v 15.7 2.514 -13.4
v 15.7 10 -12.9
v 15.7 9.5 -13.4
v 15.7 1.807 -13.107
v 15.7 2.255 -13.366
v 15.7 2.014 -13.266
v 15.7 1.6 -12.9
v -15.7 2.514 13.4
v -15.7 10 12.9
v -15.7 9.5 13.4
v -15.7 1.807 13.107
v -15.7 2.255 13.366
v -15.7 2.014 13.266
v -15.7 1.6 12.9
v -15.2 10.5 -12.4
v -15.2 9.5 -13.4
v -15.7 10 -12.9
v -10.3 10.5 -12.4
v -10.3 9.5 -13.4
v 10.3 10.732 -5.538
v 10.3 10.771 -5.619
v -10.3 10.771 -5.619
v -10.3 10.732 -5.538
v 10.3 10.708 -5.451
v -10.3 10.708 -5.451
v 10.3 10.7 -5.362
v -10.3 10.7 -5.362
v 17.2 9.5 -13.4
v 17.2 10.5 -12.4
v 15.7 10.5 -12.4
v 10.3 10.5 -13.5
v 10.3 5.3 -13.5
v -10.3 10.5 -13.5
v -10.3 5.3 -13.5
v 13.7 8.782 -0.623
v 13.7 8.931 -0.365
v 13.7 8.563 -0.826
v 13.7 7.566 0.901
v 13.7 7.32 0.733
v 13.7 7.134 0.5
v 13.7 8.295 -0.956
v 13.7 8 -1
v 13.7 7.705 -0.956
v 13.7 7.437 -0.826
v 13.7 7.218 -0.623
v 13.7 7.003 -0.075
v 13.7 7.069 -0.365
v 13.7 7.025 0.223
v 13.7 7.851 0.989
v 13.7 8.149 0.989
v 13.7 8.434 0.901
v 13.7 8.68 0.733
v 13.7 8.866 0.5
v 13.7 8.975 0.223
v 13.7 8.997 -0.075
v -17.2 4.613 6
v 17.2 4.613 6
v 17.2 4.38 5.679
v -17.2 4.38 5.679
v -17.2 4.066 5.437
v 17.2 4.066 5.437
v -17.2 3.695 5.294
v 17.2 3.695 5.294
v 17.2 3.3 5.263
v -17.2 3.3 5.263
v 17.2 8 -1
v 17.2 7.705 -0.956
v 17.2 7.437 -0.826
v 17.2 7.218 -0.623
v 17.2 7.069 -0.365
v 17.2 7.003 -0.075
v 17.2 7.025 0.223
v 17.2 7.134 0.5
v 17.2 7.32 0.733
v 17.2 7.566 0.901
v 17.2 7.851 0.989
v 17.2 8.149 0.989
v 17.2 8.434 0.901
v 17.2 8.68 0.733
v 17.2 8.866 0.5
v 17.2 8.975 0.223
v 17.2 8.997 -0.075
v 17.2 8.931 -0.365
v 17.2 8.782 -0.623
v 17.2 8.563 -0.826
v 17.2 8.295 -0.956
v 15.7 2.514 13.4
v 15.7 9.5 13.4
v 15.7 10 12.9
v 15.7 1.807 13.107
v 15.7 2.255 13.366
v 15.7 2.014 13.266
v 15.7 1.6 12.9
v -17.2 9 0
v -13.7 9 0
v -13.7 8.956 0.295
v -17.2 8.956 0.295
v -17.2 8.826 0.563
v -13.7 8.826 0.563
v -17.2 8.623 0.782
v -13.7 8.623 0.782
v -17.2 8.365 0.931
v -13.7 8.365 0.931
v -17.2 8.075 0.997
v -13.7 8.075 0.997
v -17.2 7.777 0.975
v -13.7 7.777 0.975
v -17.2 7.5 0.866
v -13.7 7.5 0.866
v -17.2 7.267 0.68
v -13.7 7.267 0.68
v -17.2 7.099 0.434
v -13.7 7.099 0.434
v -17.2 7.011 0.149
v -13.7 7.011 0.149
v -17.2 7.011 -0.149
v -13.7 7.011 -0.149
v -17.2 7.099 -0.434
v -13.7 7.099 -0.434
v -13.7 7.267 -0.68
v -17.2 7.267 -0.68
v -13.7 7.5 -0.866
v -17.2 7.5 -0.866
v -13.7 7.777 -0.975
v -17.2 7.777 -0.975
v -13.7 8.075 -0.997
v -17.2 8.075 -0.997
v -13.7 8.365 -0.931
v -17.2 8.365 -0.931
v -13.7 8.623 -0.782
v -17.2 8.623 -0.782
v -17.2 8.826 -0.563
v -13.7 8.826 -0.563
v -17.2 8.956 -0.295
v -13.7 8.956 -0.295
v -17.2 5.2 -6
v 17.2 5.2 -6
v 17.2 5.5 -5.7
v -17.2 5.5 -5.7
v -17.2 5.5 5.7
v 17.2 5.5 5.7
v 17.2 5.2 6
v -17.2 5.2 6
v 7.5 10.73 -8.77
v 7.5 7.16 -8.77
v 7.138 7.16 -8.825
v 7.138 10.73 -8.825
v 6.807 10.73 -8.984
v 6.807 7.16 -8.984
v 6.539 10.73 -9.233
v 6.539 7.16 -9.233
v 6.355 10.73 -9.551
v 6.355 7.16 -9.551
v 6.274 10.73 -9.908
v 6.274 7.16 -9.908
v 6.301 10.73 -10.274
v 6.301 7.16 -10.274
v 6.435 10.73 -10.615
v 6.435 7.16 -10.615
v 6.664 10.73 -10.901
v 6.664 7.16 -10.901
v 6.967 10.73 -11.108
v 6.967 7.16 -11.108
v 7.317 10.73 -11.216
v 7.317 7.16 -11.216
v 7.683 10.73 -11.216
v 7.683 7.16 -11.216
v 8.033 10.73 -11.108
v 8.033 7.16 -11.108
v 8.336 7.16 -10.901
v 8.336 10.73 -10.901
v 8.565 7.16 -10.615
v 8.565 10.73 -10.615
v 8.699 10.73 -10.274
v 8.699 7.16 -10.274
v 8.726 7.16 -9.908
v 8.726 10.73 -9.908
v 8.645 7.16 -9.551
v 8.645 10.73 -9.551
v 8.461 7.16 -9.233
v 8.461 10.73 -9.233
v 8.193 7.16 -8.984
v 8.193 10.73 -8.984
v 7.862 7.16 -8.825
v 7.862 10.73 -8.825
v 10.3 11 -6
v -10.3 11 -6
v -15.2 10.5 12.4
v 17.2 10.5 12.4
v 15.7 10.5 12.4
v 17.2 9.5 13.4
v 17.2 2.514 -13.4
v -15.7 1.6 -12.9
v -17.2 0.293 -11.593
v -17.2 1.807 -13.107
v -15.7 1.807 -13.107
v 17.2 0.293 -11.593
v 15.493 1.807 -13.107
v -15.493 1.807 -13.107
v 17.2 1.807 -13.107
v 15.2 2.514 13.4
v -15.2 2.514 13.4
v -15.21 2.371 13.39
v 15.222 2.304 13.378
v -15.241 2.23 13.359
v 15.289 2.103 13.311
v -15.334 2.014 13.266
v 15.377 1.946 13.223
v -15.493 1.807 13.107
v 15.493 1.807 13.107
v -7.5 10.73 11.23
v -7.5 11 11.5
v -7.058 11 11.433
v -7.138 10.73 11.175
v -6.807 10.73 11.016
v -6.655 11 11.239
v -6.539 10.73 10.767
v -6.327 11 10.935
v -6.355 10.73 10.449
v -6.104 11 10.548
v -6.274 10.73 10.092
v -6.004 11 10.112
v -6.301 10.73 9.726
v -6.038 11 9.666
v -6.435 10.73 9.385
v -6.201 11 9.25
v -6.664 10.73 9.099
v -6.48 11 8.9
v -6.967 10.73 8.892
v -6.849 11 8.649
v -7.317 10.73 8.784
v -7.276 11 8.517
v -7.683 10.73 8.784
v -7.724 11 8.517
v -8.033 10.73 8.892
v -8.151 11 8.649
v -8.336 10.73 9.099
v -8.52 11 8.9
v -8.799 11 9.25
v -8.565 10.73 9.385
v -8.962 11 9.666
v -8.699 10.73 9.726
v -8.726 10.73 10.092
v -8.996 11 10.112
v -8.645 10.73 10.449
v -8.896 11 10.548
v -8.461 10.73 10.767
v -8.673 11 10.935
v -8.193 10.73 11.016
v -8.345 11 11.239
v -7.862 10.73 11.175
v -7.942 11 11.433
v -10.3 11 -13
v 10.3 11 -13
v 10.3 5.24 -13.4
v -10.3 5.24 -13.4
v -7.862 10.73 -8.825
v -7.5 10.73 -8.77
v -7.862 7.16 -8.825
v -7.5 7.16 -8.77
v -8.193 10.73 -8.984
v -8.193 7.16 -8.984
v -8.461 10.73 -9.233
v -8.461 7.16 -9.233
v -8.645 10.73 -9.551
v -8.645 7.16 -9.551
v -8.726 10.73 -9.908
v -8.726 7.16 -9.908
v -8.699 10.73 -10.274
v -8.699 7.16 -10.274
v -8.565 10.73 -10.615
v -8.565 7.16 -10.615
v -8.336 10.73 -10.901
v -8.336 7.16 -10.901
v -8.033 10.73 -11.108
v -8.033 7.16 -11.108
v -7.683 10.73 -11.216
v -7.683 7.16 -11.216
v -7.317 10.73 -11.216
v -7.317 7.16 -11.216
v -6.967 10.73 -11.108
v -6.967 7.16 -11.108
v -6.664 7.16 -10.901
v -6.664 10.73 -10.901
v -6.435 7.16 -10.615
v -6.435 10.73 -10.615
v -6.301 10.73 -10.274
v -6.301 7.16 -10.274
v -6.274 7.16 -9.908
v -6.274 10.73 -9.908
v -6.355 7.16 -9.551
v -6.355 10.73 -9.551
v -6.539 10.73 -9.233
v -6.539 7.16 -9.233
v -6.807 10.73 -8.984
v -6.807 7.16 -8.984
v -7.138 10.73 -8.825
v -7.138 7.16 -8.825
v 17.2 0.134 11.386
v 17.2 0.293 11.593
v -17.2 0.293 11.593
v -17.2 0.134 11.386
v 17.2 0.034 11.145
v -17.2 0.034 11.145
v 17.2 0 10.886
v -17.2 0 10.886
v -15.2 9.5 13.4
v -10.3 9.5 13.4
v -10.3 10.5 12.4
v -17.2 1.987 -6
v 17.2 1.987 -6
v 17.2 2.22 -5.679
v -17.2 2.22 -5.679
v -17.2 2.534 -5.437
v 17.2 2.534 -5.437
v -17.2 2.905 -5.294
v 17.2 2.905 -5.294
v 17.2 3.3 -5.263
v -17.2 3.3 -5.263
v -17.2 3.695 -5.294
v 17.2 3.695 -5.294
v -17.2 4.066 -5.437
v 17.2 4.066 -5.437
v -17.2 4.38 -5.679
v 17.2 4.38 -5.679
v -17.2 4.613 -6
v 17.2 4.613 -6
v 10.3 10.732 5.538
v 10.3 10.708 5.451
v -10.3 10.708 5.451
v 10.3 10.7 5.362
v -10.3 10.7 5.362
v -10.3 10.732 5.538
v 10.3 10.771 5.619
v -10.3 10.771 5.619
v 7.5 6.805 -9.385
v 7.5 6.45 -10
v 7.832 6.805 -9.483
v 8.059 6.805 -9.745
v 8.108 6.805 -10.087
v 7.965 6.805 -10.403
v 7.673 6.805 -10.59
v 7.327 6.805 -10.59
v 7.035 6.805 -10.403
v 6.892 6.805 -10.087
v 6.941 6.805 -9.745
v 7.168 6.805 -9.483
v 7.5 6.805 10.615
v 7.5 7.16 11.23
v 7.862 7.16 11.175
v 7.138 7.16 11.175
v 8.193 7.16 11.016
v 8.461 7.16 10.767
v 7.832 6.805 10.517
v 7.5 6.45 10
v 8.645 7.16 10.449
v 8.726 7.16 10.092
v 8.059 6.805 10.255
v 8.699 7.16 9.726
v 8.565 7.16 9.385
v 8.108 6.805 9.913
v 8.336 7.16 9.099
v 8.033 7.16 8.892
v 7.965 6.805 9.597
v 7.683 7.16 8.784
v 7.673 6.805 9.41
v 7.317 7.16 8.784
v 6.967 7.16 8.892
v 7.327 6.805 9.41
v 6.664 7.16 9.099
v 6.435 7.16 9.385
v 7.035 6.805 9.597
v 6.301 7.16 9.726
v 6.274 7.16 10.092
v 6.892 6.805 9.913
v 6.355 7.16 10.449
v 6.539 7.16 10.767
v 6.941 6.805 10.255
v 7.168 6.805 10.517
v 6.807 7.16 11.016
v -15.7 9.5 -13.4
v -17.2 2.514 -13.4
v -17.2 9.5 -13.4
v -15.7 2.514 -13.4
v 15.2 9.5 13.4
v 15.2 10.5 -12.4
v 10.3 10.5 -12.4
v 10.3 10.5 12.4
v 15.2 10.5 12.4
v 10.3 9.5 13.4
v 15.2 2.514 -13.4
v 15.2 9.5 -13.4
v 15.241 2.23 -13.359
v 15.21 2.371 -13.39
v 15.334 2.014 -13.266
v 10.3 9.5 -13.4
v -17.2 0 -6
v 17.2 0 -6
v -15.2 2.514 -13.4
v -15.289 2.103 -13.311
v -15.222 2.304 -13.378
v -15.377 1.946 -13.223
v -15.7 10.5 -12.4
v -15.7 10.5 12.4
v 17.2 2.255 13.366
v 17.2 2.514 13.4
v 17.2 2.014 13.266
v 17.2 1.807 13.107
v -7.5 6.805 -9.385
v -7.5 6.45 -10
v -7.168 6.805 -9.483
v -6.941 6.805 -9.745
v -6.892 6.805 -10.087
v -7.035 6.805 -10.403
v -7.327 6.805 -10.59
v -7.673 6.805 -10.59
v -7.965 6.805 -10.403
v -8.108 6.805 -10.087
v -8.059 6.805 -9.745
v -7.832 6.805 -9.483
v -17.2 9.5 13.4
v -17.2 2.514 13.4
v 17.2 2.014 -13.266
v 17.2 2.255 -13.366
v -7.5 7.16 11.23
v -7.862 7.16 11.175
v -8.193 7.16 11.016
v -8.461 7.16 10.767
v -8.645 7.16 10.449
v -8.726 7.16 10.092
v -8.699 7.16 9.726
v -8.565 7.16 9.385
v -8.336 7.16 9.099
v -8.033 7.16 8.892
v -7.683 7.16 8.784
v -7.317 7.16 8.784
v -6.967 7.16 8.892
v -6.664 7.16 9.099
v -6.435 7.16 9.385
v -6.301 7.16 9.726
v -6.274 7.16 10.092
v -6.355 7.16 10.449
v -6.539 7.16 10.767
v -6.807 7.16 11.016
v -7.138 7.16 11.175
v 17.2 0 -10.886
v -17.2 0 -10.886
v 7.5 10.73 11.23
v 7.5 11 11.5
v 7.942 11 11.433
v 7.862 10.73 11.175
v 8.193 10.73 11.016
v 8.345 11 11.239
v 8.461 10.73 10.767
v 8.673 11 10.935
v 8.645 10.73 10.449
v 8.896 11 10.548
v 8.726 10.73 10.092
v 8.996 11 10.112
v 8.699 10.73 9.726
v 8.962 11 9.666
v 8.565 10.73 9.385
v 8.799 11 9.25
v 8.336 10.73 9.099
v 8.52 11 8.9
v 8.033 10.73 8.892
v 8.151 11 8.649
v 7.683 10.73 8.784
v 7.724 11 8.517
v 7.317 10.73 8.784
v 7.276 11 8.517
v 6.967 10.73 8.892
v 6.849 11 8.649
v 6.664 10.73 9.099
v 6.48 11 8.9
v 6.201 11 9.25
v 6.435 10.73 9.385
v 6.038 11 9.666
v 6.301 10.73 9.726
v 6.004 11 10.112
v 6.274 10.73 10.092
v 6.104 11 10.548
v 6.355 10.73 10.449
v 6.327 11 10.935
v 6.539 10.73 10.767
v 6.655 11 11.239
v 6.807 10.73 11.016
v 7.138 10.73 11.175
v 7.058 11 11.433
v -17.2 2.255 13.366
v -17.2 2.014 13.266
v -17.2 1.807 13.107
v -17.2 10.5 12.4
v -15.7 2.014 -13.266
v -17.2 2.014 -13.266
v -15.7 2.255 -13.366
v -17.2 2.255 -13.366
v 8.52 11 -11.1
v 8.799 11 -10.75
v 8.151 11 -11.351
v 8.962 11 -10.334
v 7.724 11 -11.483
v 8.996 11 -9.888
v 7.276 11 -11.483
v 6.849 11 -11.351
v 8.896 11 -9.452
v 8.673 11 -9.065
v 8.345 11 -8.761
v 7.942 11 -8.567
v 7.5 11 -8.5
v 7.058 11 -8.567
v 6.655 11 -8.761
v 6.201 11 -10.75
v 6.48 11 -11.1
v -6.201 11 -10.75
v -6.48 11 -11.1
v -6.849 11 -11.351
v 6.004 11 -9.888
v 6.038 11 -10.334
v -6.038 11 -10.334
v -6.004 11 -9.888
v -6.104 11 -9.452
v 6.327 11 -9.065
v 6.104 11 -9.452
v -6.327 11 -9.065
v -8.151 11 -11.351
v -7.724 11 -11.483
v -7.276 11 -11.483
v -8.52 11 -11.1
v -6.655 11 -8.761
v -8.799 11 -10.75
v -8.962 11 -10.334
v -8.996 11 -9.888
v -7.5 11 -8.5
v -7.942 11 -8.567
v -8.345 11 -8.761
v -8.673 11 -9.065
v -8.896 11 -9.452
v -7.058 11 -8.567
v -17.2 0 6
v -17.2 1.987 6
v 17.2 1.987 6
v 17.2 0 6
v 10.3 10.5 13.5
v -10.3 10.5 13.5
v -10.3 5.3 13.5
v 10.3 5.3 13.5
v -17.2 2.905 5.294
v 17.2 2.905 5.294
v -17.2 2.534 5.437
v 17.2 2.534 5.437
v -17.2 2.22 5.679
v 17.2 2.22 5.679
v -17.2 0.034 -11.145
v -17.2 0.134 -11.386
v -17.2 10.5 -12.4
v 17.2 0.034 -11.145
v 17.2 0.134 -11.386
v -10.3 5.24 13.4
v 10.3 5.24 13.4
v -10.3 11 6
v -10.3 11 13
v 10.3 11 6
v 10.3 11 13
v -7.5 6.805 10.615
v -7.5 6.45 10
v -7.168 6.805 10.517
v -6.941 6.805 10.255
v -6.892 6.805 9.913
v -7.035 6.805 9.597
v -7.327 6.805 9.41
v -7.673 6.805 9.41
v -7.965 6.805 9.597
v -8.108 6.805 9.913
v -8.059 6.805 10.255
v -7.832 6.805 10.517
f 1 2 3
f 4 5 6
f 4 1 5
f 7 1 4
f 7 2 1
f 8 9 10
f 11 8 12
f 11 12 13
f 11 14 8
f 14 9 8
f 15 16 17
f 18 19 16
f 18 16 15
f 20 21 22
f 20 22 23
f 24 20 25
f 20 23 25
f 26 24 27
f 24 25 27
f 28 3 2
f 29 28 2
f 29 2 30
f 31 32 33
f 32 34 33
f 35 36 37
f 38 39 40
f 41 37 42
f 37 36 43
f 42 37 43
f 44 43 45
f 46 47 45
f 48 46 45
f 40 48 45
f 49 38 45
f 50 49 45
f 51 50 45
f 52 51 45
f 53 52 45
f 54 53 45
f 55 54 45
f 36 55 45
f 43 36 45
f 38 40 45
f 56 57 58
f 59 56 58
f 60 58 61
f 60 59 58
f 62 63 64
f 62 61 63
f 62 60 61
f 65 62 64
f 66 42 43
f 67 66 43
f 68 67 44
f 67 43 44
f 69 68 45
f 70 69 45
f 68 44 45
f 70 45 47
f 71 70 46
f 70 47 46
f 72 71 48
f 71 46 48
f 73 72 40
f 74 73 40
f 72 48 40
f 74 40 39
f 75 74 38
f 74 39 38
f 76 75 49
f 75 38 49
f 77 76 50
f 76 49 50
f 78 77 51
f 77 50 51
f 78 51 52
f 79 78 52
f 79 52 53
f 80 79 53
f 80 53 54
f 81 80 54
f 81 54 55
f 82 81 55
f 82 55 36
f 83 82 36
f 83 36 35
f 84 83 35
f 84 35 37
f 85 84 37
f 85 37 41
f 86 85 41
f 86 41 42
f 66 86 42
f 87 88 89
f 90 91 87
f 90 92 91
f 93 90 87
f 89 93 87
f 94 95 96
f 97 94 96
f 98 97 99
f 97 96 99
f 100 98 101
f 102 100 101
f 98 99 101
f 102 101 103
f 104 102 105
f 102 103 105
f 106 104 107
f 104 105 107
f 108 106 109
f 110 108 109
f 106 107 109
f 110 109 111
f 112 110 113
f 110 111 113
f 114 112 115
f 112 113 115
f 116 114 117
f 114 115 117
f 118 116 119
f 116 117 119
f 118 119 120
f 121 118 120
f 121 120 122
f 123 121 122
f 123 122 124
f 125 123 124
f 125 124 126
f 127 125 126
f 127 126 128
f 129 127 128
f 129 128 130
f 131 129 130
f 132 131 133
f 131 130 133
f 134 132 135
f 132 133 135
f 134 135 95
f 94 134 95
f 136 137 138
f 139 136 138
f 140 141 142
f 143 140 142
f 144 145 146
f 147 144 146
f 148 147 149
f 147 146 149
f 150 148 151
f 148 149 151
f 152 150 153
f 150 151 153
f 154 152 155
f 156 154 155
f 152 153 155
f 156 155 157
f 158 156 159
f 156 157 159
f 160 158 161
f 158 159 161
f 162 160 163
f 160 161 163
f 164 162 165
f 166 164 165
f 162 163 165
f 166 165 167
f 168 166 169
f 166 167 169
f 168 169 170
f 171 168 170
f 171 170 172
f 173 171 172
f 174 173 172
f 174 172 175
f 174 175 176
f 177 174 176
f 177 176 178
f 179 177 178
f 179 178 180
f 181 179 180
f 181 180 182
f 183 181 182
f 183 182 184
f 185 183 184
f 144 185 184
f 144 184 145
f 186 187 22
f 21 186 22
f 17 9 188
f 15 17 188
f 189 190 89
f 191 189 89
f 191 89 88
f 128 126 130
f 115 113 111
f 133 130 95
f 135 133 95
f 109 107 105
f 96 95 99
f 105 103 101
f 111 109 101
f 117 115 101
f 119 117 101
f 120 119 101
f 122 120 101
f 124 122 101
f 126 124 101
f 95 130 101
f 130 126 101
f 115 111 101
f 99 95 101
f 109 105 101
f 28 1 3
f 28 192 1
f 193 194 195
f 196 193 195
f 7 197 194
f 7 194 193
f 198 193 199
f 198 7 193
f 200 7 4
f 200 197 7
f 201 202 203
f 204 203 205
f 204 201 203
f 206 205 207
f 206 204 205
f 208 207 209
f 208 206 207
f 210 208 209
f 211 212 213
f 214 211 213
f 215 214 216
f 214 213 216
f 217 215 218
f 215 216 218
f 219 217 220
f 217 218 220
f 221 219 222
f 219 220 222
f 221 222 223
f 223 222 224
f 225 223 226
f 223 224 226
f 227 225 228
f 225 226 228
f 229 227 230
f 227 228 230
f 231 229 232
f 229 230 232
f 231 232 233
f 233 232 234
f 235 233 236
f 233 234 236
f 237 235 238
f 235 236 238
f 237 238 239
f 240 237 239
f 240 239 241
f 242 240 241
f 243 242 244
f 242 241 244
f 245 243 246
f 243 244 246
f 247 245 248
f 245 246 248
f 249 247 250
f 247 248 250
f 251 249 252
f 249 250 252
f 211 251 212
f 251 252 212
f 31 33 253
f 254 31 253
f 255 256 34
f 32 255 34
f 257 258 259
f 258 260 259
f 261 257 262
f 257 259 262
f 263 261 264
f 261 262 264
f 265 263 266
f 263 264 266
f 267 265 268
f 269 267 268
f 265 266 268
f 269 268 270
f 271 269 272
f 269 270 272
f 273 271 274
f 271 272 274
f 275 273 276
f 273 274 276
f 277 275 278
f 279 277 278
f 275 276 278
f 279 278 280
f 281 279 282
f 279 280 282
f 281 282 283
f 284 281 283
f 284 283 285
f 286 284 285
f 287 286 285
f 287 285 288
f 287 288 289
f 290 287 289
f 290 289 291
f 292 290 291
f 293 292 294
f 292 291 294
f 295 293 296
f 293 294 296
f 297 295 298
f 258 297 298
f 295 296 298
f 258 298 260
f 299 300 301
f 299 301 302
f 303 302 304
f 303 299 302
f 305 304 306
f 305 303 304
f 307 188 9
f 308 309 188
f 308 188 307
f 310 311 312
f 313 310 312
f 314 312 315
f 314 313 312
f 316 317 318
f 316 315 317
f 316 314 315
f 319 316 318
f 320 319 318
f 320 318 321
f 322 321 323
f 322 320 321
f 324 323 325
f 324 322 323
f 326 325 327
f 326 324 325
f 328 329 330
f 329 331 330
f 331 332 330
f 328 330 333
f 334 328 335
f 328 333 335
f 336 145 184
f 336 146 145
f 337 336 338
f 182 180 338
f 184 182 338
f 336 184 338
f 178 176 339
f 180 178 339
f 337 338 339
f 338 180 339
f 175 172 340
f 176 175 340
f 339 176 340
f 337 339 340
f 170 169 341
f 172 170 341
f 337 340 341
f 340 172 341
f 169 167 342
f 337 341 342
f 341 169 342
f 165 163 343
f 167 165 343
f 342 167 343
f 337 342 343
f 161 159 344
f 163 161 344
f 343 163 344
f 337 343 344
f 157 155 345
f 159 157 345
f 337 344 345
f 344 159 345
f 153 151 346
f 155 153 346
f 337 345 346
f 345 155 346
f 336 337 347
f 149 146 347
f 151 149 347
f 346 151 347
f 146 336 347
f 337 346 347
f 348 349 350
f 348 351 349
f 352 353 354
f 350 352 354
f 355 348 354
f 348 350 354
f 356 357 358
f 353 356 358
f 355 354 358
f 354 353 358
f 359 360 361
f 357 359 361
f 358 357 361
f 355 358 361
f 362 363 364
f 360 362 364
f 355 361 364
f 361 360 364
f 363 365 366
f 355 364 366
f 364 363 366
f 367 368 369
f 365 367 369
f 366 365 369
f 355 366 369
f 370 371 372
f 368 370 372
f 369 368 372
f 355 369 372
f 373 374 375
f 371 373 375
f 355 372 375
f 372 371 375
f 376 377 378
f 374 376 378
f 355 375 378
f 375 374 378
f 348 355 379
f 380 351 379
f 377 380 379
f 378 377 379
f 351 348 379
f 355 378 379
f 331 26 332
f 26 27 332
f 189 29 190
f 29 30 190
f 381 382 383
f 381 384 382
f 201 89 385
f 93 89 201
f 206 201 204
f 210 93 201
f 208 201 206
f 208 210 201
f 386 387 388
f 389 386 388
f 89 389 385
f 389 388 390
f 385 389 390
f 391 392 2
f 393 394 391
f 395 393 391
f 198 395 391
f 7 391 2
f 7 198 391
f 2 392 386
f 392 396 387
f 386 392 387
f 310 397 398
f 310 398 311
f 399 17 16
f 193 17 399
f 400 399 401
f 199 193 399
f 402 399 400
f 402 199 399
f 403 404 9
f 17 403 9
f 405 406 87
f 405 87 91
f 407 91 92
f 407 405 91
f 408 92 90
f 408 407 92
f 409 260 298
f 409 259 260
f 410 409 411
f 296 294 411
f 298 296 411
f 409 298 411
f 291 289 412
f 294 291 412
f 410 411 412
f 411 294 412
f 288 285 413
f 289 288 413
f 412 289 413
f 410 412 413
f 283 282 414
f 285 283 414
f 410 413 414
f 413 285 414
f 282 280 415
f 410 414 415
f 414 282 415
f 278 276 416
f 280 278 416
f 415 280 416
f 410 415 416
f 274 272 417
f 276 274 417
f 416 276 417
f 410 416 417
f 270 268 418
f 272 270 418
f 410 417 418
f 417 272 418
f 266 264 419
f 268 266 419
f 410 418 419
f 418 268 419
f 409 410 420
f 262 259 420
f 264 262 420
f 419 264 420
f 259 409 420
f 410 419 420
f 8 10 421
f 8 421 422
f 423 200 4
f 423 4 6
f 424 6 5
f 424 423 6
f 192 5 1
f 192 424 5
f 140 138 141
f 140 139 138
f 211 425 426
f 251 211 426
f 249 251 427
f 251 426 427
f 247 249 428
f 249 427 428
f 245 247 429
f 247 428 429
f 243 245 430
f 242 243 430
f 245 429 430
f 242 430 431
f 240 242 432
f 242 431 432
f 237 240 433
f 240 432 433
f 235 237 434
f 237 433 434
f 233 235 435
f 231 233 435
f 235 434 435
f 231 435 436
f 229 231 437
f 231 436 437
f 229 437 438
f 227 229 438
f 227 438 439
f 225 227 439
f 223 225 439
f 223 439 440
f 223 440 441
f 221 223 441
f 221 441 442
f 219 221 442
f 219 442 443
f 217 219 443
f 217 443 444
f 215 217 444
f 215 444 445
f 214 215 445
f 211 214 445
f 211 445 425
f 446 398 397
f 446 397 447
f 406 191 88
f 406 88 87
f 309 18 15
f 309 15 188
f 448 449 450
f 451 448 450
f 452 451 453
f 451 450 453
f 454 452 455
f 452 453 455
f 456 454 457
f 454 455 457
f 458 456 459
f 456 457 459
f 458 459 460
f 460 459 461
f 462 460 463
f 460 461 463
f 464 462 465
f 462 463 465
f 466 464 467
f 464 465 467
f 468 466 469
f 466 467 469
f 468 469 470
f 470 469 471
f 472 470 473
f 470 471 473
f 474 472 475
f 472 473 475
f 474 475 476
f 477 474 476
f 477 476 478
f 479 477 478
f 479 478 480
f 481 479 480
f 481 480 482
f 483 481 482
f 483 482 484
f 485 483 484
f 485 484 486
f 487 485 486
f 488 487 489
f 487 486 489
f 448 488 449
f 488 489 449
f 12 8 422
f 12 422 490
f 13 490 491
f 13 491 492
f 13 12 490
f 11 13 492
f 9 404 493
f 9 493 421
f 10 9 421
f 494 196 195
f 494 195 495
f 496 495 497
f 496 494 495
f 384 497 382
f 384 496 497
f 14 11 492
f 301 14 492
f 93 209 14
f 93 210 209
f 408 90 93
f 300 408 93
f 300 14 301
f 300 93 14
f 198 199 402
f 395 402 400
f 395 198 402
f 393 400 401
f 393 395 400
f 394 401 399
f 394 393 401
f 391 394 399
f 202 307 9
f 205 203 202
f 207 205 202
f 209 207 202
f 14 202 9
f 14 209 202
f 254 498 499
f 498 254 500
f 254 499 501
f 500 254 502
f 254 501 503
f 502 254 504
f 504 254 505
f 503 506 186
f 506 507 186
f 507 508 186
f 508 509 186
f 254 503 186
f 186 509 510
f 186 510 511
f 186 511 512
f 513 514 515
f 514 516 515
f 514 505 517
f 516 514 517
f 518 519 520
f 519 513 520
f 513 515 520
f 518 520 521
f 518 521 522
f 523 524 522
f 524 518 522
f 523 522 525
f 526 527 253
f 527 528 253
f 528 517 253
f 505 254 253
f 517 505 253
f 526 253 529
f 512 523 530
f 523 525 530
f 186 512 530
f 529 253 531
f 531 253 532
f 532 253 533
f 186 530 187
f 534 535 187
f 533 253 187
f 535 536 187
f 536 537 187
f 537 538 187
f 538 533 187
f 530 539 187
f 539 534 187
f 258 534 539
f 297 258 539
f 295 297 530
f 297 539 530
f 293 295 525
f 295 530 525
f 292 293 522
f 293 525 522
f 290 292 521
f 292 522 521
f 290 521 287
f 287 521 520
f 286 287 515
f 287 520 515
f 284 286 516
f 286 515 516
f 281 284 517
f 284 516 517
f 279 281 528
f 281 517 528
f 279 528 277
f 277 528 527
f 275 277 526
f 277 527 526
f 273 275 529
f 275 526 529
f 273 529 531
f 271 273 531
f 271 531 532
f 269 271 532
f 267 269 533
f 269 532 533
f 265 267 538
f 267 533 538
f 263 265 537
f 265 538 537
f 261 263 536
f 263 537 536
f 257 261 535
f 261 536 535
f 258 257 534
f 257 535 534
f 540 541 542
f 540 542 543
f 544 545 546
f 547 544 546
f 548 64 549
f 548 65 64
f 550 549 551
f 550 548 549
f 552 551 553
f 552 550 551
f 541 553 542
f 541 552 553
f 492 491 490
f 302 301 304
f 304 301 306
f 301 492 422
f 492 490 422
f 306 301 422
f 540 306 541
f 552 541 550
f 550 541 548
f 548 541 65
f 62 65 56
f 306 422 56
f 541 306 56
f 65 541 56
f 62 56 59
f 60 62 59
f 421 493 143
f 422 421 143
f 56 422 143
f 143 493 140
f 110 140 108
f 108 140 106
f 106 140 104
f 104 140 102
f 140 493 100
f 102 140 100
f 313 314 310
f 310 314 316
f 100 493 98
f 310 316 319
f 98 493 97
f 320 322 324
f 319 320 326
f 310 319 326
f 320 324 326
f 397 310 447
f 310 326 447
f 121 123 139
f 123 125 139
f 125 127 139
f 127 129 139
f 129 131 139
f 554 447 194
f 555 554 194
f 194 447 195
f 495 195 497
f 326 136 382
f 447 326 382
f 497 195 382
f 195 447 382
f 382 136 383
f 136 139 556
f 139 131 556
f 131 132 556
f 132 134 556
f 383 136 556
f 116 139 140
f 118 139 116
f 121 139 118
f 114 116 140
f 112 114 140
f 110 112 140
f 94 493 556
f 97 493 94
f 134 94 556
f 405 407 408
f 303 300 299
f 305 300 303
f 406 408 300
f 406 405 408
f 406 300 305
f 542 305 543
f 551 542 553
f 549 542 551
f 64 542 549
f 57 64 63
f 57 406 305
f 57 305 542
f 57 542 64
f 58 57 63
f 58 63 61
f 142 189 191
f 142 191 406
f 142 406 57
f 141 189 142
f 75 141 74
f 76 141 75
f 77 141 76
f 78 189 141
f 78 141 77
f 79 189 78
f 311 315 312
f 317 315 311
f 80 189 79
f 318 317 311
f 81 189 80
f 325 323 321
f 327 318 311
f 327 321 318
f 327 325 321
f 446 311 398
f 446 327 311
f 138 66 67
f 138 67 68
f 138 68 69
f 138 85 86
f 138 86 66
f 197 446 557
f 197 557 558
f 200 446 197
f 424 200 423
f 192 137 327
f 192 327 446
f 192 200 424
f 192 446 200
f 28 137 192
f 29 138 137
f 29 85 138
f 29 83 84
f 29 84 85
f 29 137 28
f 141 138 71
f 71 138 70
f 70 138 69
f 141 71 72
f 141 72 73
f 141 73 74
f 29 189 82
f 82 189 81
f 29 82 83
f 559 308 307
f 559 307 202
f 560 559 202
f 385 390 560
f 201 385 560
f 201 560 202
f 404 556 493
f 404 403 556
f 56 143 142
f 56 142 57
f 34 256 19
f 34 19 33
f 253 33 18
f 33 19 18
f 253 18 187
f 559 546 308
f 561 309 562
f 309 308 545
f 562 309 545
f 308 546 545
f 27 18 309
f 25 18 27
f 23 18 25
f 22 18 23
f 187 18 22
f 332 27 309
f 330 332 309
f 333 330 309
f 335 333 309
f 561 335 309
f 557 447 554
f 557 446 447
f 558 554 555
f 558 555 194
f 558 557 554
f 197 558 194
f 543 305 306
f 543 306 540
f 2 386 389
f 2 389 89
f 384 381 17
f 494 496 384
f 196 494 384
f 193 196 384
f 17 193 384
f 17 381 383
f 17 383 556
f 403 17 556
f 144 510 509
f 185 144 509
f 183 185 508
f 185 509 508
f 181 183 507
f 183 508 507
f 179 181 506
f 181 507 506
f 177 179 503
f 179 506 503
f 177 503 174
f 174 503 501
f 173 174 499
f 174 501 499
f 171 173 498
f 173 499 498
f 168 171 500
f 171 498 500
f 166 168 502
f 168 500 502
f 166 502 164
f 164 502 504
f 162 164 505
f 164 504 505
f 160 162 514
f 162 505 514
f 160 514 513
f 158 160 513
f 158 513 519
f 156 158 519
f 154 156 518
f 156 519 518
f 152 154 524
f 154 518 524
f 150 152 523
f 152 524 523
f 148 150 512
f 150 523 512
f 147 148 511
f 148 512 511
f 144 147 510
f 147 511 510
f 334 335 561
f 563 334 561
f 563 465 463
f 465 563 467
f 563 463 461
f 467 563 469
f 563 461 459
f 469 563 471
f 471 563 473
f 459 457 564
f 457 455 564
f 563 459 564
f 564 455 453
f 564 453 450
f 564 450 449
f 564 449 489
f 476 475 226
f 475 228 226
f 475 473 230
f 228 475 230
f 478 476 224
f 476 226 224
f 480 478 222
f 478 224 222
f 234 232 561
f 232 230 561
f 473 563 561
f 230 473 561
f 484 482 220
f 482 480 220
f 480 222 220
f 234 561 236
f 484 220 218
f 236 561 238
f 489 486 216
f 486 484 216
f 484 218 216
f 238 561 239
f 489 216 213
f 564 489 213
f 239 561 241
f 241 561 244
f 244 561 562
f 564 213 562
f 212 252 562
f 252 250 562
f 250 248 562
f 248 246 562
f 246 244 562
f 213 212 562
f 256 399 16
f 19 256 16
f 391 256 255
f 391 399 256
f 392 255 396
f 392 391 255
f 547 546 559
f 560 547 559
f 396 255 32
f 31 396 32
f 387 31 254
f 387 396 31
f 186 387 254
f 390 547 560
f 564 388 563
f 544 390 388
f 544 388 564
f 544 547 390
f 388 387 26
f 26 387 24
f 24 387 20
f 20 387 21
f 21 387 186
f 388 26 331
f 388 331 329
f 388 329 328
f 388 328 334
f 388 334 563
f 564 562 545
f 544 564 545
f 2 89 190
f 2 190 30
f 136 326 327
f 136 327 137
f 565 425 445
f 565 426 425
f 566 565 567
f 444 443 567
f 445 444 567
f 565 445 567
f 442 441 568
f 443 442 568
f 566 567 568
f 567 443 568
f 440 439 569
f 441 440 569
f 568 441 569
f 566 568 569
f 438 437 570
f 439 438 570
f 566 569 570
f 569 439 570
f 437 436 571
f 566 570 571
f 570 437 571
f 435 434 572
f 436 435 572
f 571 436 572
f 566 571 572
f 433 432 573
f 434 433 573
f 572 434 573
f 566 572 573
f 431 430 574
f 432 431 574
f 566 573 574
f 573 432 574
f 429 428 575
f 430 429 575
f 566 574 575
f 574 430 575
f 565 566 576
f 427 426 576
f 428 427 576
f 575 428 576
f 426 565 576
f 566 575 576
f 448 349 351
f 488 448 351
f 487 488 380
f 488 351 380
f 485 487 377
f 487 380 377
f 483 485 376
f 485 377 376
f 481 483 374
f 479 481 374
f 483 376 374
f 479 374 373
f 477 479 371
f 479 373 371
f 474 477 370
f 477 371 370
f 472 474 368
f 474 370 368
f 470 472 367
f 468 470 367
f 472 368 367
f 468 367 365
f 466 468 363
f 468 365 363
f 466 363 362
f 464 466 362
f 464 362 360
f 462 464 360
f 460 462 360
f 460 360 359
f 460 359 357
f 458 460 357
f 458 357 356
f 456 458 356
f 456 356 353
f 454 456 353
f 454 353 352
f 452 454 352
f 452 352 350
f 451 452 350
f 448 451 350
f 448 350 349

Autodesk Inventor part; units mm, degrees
sketch "Sketch_3" plane through (0, 0, 0) normal (1, 0, 0) x (0, 1, 0)
  line L0 (10.5, 13.5) -> (5.3, 13.5)
  line L1 (5.3, 13.5) -> (5.24, 13.4)
  line L2 (5.24, 13.4) -> (2.5142, 13.4)
  arc A0 (2.5142, 13.4) -> (1.8071, 13.1071) centre (2.5142, 12.4) ccw
  line L3 (1.8071, 13.1071) -> (0.2929, 11.5929)
  arc A1 (0.2929, 11.5929) -> (0, 10.8858) centre (1, 10.8858) ccw
  line L4 (0, 10.8858) -> (0, -10.8858)
  arc A2 (0, -10.8858) -> (0.2929, -11.5929) centre (1, -10.8858) ccw
  line L5 (0.2929, -11.5929) -> (1.8071, -13.1071)
  arc A3 (1.8071, -13.1071) -> (2.5142, -13.4) centre (2.5142, -12.4) ccw
  line L6 (2.5142, -13.4) -> (5.24, -13.4)
  line L7 (5.24, -13.4) -> (5.3, -13.5)
  line L8 (5.3, -13.5) -> (10.5, -13.5)
  line L9 (10.5, -13.5) -> (11, -13)
  line L10 (11, -13) -> (11, -6)
  line L11 (11, -6) -> (10.7713, -5.6188)
  arc A4 (10.7, -5.3615) -> (10.7713, -5.6188) centre (11.2, -5.3615) ccw
  line L12 (10.7, -5.3615) -> (10.7, 5.3615)
  arc A5 (10.7713, 5.6188) -> (10.7, 5.3615) centre (11.2, 5.3615) ccw
  line L13 (10.7713, 5.6188) -> (11, 6)
  line L14 (11, 6) -> (11, 13)
  line L15 (11, 13) -> (10.5, 13.5)
extrude "Extrusion1" add sketch "Sketch_3" along normal mid plane 20.6
sketch "Sketch_9" plane through (10.3, 0, 0) normal (1, 0, 0) x (0, 0, -1)
  arc A0 (-13.4, 2.5142) -> (-13.1071, 1.8071) centre (-12.4, 2.5142) ccw
  line L0 (-13.1071, 1.8071) -> (-11.5929, 0.2929)
  arc A1 (-11.5929, 0.2929) -> (-10.8858, 0) centre (-10.8858, 1) ccw
  line L1 (-10.8858, 0) -> (10.8858, 0)
  arc A2 (10.8858, 0) -> (11.5929, 0.2929) centre (10.8858, 1) ccw
  line L2 (11.5929, 0.2929) -> (13.1071, 1.8071)
  arc A3 (13.1071, 1.8071) -> (13.4, 2.5142) centre (12.4, 2.5142) ccw
  line L3 (13.4, 2.5142) -> (13.4, 9.5)
  line L4 (13.4, 9.5) -> (12.4, 10.5)
  line L5 (12.4, 10.5) -> (-12.4, 10.5)
  line L6 (-12.4, 10.5) -> (-13.4, 9.5)
  line L7 (-13.4, 9.5) -> (-13.4, 2.5142)
extrude "Extrusion2" add sketch "Sketch_9" along normal blind 6.9
sketch "Sketch_15" plane through (-10.3, 0, 0) normal (1, 0, 0) x (0, 0, -1)
  arc A0 (-13.4, 2.5142) -> (-13.1071, 1.8071) centre (-12.4, 2.5142) ccw
  line L0 (-13.1071, 1.8071) -> (-11.5929, 0.2929)
  arc A1 (-11.5929, 0.2929) -> (-10.8858, 0) centre (-10.8858, 1) ccw
  line L1 (-10.8858, 0) -> (10.8858, 0)
  arc A2 (10.8858, 0) -> (11.5929, 0.2929) centre (10.8858, 1) ccw
  line L2 (11.5929, 0.2929) -> (13.1071, 1.8071)
  arc A3 (13.1071, 1.8071) -> (13.4, 2.5142) centre (12.4, 2.5142) ccw
  line L3 (13.4, 2.5142) -> (13.4, 9.5)
  line L4 (13.4, 9.5) -> (12.4, 10.5)
  line L5 (12.4, 10.5) -> (-12.4, 10.5)
  line L6 (-12.4, 10.5) -> (-13.4, 9.5)
  line L7 (-13.4, 9.5) -> (-13.4, 2.5142)
extrude "Extrusion3" add sketch "Sketch_15" against normal blind 6.9
sketch "Sketch_40" plane through (0, 0, 0) normal (1, 0, 0) x (0, 1, 0)
  line L0 (-1.5, 6) -> (-2, 5.5)
  line L1 (-2, 5.5) -> (-2, -5.5)
  line L2 (-2, -5.5) -> (-1.5, -6)
  line L3 (-1.5, -6) -> (1.9874, -6)
  arc A0 (3.3, -5.2629) -> (1.9874, -6) centre (3.21, -6.64) ccw
  arc A1 (4.6126, -6) -> (3.3, -5.2629) centre (3.39, -6.64) ccw
  line L4 (4.6126, -6) -> (5.2, -6)
  line L5 (5.2, -6) -> (5.5, -5.7)
  line L6 (5.5, -5.7) -> (5.5, 5.7)
  line L7 (5.5, 5.7) -> (5.2, 6)
  line L8 (5.2, 6) -> (4.6126, 6)
  arc A2 (3.3, 5.2629) -> (4.6126, 6) centre (3.39, 6.64) ccw
  arc A3 (1.9874, 6) -> (3.3, 5.2629) centre (3.21, 6.64) ccw
  line L9 (1.9874, 6) -> (-1.5, 6)
extrude "Extrusion4" cut sketch "Sketch_40" along normal mid plane 34.4
sketch "Sketch5" plane through (-10.3, 11, 6) normal (0, 1, 0) x (1, 0, 0)
  point P0 (17.8, -4)
hole "Hole1" at (7.5, 11, 10) direction (0, -1, 0) diameter 2.459 depth 3.84 tip angle 120 countersink diameter 3 countersink angle 90 thread size "M3x0.5" class "6H" standard "ISO Metric profile"
pattern_linear "Rectangular Pattern1" count 2 spacing 20 along (0, 0, -1) count 2 spacing 15 along (-1, 0, 0) of "Hole1"
sketch "Sketch_38" plane through (0, 0, 0) normal (0, 0, 1) x (1, 0, 0)
  line L0 (15.2, 10.5) -> (15.7, 10)
  line L1 (15.7, 10) -> (15.7, 10.5)
  line L2 (15.7, 10.5) -> (15.2, 10.5)
extrude "Extrusion5" cut sketch "Sketch_38" along normal mid plane 26.8
sketch "Sketch_39" plane through (0, 0, 0) normal (0, 0, 1) x (1, 0, 0)
  line L0 (-15.7, 10.5) -> (-15.7, 10)
  line L1 (-15.7, 10) -> (-15.2, 10.5)
  line L2 (-15.2, 10.5) -> (-15.7, 10.5)
extrude "Extrusion6" cut sketch "Sketch_39" along normal mid plane 26.8
sketch "Sketch_21" plane through (0, 0, 0) normal (0, 1, 0) x (-1, 0, 0)
  line L0 (15.7, -13.4) -> (15.7, -12.9)
  line L1 (15.7, -12.9) -> (15.2, -13.4)
  line L2 (15.2, -13.4) -> (15.7, -13.4)
extrude "Extrusion7" cut sketch "Sketch_21" along normal blind 11
sketch "Sketch_22" plane through (0, 0, 0) normal (0, 1, 0) x (-1, 0, 0)
  line L0 (-15.2, -13.4) -> (-15.7, -12.9)
  line L1 (-15.7, -12.9) -> (-15.7, -13.4)
  line L2 (-15.7, -13.4) -> (-15.2, -13.4)
extrude "Extrusion8" cut sketch "Sketch_22" along normal blind 11
sketch "Sketch_23" plane through (0, 0, 0) normal (0, 1, 0) x (-1, 0, 0)
  line L0 (-15.2, 13.4) -> (-15.7, 13.4)
  line L1 (-15.7, 13.4) -> (-15.7, 12.9)
  line L2 (-15.7, 12.9) -> (-15.2, 13.4)
extrude "Extrusion9" cut sketch "Sketch_23" along normal blind 11
sketch "Sketch_24" plane through (0, 0, 0) normal (0, 1, 0) x (-1, 0, 0)
  line L0 (15.7, 13.4) -> (15.2, 13.4)
  line L1 (15.2, 13.4) -> (15.7, 12.9)
  line L2 (15.7, 12.9) -> (15.7, 13.4)
extrude "Extrusion10" cut sketch "Sketch_24" along normal blind 11
sketch "Sketch12" plane through (17.2, 0, 0) normal (1, 0, 0) x (0, 0, -1)
  point P0 (0, 8)
hole "Hole2" at (17.2, 8, 0) direction (-1, 0, 0) diameter 2 depth 3.5
sketch "Sketch_32" plane through (0, 0, 0) normal (0, 0, 1) x (1, 0, 0)
  line L0 (-13.7, 8) -> (-17.2, 8)
  line L1 (-17.2, 8) -> (-17.2, 9)
  line L2 (-17.2, 9) -> (-13.7, 9)
  line L3 (-13.7, 9) -> (-13.7, 8)
  line L4 (-13.7, 8) -> (-17.2, 8)
revolve "Revolution1" cut sketch "Sketch_32" angle 360 about axis through (-13.7, 8, 0) along (1, 0, 0)
ref_plane "4track_XY" through (0, 0, 0) normal (1, 0, 0) x (0, 0, -1)
ref_plane "4track_YZ" through (0, 0, 0) normal (0, 0, -1) x (0, 1, 0)
ref_plane "4track_ZX" through (0, 0, 0) normal (0, 1, 0) x (1, 0, 0)
properties part number "SRS12MSS Slider" material "Steel, Alloy"
